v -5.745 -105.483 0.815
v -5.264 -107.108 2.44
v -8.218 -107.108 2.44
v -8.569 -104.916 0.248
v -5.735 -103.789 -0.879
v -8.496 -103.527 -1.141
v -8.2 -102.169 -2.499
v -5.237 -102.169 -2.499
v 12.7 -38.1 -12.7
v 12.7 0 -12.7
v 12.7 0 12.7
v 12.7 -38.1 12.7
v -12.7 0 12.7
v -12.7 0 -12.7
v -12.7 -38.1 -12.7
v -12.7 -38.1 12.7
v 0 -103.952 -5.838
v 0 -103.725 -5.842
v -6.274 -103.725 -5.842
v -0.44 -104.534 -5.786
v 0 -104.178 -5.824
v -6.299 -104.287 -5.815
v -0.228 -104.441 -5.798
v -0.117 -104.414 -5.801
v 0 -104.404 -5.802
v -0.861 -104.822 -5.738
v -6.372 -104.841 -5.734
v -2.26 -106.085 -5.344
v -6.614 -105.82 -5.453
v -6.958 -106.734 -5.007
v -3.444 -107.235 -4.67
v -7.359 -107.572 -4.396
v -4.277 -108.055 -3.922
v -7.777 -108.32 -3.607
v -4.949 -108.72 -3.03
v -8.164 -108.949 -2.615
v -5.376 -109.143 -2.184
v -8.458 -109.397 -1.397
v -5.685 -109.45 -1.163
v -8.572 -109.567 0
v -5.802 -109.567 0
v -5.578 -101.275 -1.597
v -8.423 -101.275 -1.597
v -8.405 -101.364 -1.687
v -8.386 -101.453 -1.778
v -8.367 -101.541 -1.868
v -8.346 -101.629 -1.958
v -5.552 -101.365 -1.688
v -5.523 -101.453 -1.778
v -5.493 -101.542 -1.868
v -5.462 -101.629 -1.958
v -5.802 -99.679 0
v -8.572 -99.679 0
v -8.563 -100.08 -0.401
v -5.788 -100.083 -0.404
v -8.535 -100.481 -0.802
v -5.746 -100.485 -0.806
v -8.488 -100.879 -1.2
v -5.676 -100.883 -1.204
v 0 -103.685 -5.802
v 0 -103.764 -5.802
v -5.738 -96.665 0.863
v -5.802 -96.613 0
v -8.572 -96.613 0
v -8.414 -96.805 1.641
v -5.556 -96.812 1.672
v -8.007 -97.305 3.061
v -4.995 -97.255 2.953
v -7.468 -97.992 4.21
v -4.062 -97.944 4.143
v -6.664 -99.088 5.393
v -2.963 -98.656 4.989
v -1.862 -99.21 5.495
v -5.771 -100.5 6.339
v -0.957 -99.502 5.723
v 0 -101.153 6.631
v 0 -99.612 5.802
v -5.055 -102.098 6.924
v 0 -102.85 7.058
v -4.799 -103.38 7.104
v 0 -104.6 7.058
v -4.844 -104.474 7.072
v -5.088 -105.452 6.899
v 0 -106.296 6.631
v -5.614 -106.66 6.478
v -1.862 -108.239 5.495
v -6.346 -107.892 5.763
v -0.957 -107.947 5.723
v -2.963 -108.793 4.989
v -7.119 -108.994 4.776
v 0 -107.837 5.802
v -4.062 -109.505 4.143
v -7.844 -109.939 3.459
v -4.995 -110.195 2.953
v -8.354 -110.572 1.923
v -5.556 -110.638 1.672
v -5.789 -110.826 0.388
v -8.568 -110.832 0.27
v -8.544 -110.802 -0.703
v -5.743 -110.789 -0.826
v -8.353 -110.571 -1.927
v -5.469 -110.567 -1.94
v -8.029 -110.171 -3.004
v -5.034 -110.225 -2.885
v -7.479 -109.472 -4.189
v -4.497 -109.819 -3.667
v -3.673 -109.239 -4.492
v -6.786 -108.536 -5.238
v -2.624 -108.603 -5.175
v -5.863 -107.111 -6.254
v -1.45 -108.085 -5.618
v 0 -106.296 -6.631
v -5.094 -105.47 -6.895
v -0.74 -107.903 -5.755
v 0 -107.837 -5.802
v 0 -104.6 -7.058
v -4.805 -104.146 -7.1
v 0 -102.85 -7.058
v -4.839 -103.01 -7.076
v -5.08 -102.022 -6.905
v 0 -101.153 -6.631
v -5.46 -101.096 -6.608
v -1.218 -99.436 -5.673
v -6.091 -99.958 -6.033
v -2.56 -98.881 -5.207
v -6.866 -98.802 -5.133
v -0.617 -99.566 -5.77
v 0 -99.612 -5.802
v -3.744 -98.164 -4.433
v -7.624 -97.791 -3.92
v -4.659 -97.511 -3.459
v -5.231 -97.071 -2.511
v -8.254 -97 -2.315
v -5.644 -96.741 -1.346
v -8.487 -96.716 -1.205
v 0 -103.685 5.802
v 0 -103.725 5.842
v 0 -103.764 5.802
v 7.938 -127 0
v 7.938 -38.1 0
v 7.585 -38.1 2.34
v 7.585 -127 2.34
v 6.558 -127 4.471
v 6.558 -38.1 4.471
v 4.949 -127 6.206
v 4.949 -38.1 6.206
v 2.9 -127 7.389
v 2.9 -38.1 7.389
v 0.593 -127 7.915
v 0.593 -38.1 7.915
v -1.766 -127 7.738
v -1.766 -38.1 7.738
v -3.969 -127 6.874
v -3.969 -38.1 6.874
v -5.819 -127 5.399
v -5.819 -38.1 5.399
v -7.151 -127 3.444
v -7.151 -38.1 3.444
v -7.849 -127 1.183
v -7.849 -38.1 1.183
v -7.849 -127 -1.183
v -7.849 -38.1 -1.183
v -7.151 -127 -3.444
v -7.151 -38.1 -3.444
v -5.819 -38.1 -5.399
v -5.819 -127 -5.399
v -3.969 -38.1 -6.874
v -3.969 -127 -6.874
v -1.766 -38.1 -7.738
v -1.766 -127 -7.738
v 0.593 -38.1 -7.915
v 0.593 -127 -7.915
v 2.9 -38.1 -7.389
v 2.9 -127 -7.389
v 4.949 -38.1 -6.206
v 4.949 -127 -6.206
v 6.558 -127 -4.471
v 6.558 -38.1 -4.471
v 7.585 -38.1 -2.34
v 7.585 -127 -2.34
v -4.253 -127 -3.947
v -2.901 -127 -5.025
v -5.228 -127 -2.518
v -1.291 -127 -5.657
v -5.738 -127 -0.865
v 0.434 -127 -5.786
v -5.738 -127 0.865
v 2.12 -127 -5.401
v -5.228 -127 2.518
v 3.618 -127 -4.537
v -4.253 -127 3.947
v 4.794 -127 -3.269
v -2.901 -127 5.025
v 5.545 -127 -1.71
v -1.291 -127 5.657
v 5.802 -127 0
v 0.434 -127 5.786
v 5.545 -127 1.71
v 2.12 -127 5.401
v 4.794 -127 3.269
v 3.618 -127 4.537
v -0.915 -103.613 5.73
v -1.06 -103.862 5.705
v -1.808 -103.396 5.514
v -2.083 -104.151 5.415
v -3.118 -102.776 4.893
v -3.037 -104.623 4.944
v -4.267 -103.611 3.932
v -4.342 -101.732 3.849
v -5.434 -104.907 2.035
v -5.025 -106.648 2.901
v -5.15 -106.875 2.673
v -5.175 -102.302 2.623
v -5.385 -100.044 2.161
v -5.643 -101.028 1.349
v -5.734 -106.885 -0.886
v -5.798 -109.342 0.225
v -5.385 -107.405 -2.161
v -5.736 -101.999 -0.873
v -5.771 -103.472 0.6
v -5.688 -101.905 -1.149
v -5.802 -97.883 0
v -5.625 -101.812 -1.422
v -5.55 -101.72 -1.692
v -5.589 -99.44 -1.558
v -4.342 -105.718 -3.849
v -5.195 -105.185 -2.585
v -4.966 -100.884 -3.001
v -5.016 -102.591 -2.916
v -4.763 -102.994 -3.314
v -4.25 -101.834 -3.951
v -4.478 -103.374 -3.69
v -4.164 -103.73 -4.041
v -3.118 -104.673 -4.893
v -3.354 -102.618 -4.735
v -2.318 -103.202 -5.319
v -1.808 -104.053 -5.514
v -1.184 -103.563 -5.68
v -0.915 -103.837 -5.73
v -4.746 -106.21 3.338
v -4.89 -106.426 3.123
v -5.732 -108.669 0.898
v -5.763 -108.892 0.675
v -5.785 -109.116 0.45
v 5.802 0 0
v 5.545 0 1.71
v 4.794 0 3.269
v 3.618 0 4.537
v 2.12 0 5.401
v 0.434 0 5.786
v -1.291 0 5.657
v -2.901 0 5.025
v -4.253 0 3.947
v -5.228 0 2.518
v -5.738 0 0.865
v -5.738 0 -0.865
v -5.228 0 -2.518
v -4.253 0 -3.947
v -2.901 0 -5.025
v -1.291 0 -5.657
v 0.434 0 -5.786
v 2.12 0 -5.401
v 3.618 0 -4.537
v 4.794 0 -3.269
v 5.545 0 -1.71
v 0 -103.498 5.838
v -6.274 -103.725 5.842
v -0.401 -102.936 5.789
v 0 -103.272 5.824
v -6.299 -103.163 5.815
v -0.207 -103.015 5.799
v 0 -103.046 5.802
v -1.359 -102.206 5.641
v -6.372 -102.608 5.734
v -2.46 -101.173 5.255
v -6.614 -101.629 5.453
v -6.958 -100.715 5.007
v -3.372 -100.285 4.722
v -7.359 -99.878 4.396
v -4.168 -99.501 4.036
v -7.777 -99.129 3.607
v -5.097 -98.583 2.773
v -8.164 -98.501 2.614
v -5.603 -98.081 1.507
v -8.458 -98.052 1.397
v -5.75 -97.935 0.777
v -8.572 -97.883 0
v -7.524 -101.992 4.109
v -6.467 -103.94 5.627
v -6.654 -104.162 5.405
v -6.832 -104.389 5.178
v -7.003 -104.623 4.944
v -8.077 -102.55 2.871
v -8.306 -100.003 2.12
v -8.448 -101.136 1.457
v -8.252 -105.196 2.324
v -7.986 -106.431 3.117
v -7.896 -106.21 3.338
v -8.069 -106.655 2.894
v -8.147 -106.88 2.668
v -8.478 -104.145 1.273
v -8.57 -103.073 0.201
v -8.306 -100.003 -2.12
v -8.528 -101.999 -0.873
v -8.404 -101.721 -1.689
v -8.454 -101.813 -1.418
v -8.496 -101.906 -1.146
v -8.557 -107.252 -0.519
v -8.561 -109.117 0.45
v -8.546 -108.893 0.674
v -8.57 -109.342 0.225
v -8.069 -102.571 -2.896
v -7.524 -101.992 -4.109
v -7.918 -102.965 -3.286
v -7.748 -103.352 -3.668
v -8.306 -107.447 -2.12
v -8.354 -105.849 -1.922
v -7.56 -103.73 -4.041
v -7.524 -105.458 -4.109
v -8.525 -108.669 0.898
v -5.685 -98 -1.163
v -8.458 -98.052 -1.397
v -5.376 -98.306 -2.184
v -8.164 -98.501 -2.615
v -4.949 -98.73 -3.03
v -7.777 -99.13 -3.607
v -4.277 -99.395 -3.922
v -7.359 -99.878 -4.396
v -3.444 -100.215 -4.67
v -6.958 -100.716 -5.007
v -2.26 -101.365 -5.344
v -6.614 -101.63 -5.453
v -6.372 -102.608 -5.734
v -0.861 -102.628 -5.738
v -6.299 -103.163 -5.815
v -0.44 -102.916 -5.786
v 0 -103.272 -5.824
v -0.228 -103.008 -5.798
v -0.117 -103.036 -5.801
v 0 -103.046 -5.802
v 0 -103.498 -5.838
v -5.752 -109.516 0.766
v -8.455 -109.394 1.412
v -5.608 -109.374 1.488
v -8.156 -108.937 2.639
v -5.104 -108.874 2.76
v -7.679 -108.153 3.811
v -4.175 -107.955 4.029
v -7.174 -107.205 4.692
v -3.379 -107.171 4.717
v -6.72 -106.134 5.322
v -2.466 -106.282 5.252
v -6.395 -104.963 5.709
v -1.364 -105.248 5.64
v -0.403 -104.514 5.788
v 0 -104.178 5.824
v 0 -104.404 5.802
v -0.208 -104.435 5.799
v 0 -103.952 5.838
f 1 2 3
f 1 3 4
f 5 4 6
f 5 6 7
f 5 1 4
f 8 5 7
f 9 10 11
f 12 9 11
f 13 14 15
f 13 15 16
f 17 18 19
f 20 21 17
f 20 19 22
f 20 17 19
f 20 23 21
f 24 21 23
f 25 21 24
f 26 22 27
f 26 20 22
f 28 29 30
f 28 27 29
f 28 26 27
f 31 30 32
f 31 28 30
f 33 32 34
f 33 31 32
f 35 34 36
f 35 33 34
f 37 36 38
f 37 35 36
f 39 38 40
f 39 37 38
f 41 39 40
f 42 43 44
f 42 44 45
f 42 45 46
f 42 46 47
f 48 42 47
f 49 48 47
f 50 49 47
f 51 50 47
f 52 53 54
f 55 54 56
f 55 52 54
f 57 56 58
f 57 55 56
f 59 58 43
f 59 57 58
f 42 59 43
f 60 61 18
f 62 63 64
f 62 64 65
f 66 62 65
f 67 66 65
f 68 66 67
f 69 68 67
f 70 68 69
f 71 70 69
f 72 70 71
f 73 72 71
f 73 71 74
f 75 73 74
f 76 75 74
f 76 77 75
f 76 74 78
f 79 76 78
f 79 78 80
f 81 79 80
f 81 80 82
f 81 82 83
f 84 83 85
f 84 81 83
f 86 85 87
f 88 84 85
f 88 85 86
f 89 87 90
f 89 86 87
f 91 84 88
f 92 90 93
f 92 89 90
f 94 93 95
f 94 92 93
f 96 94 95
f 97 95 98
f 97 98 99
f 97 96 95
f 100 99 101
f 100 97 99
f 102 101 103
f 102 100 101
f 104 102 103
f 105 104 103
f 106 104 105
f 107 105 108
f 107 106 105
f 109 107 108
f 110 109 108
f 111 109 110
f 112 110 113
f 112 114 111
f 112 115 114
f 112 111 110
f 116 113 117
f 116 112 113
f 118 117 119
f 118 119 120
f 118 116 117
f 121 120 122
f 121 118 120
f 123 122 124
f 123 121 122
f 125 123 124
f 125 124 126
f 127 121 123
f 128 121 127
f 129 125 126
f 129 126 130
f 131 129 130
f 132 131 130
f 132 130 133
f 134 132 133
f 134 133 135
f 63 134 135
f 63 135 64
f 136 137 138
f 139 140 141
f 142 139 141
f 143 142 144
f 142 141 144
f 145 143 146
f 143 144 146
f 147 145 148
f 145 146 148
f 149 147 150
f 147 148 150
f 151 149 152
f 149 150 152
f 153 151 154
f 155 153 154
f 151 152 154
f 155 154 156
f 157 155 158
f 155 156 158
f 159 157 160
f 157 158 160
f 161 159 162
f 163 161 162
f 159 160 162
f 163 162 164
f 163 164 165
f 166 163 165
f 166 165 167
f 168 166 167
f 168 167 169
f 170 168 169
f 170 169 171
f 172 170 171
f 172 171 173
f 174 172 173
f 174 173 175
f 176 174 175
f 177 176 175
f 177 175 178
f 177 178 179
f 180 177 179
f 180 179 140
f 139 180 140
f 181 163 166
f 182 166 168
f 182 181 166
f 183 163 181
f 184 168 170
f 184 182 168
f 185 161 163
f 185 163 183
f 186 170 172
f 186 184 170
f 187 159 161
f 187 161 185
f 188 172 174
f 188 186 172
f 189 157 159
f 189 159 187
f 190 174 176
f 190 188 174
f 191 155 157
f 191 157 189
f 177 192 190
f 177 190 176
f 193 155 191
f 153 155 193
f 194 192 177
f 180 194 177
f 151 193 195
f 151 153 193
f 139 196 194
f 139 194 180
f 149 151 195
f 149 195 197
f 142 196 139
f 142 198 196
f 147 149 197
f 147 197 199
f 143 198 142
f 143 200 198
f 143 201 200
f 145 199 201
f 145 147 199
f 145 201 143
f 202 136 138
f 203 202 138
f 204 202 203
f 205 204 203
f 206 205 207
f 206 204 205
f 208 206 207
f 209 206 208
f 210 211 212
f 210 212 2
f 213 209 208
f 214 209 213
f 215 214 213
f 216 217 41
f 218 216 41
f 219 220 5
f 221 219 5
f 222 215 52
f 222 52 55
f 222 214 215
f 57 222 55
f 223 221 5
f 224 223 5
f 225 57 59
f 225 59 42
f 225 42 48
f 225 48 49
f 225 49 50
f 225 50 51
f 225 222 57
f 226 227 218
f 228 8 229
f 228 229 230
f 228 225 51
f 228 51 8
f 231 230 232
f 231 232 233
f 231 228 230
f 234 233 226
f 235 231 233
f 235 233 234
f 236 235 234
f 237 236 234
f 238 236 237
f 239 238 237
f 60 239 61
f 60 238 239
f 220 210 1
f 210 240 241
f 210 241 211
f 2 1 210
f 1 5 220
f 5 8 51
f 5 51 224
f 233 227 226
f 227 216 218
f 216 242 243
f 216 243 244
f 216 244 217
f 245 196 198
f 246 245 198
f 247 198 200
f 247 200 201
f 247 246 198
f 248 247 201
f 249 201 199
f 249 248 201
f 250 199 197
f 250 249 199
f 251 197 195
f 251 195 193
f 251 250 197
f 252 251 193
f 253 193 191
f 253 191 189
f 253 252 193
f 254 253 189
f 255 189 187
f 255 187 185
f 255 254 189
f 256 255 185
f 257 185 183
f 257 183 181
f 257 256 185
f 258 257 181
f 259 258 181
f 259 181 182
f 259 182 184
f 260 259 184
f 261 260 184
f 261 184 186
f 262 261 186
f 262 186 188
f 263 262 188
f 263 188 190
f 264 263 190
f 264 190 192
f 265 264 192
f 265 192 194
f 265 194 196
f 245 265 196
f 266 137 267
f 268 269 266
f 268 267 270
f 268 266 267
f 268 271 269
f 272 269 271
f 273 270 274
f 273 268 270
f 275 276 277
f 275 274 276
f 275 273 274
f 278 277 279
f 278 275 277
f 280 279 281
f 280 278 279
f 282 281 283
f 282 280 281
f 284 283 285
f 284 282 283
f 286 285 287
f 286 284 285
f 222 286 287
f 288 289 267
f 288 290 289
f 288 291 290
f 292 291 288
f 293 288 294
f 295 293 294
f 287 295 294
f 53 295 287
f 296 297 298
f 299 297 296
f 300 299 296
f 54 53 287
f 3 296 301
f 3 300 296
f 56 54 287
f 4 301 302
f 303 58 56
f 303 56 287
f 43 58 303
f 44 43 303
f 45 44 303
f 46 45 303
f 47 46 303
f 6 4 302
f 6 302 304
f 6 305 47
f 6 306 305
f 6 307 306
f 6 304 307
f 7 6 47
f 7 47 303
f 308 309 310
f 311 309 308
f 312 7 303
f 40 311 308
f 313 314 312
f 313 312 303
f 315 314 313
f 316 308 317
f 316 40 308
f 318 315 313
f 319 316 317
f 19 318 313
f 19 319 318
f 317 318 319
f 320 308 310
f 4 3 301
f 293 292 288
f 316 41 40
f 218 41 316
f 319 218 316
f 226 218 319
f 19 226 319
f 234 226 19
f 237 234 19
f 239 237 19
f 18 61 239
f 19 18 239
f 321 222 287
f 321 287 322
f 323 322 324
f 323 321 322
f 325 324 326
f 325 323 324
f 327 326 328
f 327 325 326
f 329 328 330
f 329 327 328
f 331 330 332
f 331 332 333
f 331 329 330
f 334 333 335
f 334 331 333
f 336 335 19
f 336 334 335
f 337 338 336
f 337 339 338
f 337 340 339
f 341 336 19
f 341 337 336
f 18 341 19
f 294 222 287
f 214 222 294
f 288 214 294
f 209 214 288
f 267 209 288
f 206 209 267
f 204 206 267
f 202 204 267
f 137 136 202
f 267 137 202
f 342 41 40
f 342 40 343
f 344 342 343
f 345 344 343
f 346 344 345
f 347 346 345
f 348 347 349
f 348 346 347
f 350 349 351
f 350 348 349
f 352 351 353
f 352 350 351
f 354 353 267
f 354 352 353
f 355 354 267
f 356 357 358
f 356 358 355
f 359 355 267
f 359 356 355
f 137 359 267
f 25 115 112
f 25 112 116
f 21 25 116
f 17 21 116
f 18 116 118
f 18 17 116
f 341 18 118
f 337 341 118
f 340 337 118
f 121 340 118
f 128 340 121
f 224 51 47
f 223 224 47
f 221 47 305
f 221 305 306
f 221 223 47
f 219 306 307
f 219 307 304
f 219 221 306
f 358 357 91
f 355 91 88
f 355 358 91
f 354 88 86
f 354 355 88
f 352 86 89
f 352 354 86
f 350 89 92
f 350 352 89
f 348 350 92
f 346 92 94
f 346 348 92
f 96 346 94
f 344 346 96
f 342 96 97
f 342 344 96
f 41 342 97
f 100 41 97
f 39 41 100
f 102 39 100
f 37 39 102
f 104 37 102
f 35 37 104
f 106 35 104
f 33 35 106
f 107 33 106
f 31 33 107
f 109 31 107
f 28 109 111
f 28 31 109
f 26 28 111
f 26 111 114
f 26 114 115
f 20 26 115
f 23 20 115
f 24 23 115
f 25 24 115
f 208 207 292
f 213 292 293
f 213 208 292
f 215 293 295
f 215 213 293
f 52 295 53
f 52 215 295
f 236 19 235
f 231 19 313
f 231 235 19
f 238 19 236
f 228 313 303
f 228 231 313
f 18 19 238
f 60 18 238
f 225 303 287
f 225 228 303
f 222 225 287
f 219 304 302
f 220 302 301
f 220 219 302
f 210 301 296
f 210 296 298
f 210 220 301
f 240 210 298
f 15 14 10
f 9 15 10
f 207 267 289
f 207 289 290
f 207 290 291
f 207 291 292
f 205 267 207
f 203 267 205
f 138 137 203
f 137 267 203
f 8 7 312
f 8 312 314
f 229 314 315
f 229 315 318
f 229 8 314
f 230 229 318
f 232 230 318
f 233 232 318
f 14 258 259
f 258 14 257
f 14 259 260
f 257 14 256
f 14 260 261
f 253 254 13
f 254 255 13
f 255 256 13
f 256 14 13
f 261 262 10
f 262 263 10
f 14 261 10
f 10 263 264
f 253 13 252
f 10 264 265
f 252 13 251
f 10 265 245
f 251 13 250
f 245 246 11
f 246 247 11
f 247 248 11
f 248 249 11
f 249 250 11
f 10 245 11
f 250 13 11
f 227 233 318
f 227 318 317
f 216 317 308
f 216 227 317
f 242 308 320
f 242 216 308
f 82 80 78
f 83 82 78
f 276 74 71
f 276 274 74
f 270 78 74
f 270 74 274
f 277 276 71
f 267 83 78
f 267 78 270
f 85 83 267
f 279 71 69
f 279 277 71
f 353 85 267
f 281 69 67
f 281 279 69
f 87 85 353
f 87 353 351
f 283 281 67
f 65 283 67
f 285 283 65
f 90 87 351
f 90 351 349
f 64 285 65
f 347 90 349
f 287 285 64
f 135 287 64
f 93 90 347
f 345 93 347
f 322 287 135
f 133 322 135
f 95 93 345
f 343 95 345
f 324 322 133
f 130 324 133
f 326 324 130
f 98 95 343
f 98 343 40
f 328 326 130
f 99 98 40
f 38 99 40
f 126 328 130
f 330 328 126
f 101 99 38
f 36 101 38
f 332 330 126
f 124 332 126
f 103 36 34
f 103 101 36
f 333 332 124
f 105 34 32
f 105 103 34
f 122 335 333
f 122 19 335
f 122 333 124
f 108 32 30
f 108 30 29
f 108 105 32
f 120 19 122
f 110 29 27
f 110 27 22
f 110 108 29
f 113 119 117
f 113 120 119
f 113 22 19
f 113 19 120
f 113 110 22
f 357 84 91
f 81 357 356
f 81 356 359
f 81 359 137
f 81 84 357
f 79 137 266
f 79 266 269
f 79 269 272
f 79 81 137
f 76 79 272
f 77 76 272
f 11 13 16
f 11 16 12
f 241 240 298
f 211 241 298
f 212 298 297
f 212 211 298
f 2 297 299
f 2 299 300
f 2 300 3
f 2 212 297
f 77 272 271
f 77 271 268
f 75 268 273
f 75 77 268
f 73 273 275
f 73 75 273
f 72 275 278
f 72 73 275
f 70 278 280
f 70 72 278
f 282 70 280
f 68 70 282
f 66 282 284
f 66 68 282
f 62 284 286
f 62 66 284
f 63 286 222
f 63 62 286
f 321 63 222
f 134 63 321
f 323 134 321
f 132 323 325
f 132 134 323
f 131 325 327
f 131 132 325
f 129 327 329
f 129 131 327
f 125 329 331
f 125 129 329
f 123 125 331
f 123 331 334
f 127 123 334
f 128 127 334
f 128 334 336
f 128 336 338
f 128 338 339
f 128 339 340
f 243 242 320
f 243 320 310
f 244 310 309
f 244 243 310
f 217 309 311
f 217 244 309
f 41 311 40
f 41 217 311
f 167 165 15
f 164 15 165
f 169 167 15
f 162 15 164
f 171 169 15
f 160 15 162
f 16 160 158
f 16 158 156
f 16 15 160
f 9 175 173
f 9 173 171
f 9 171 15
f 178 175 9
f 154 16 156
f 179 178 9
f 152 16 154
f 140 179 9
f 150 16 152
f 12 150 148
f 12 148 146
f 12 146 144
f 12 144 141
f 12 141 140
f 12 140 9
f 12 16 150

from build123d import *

# Parameters (mm, degrees)
F0_W     = 25.4
F0_H     = 25.4
F0_R     = 7.9375
F0_R_2   = 5.802411
F1_DEPTH = 38.1
F2_DEPTH = 127
F3_R     = 7.112015
F4_DEPTH = 12.7
F6_R     = 29.398476
F6_R_2   = 8.5725
F7_DEPTH = 32.766
F8_DEPTH = 152.4


with BuildPart() as f1:
    # F0 (on Front) → F1 (new body)
    with BuildSketch(Plane.XZ):
        Rectangle(F0_W, F0_H)
        Circle(F0_R, mode=Mode.SUBTRACT)
        Circle(F0_R)
        Circle(F0_R_2, mode=Mode.SUBTRACT)
    extrude(amount=F1_DEPTH)

    # F0 (on Front) → F2 (join)
    with BuildSketch(Plane.XZ):
        Circle(F0_R)
        Circle(F0_R_2, mode=Mode.SUBTRACT)
    extrude(amount=F2_DEPTH)


with BuildPart() as f4:
    # F3 (on Right) → F4 (new body)
    with BuildSketch(Plane.YZ):
        with Locations((-103.724845, 0)):
            Circle(F3_R)
        with BuildLine():
            ThreePointArc((-103.724845, 5.842015), (-99.593916, 4.130929), (-97.882829, 0))
            ThreePointArc((-97.882829, 0), (-99.593916, -4.130929), (-103.724845, -5.842015))
            ThreePointArc((-103.724845, -5.842015), (-107.855773, -4.130929), (-109.56686, 0))
            ThreePointArc((-109.56686, 0), (-107.855773, 4.130929), (-103.724845, 5.842015))
        make_face(mode=Mode.SUBTRACT)
        Polygon((-103.724845, -5.842015), (-97.882829, 0), (-103.724845, 5.842015), (-104.62287, 4.94399), (-99.678881, 0), (-101.275412, -1.596532), (-101.629339, -1.957809), (-101.999129, -0.872815), (-106.210212, 3.338268), (-107.108238, 2.440243), (-102.169097, -2.498898), (-103.729694, -4.041115), (-108.668834, 0.898026), (-109.56686, 0), align=None)
    extrude(amount=-F4_DEPTH)

    # F6 (on face) → F7 (cut)
    with BuildSketch(Plane.XZ.offset(127)):
        Circle(F6_R)
        Circle(F6_R_2, mode=Mode.SUBTRACT)
    extrude(amount=-F7_DEPTH, mode=Mode.SUBTRACT)

    # F0 (on Front) → F8 (cut)
    with BuildSketch(Plane.XZ):
        Circle(F0_R_2)
    extrude(amount=F8_DEPTH, mode=Mode.SUBTRACT)


solid = Compound([f1.part, f4.part])
